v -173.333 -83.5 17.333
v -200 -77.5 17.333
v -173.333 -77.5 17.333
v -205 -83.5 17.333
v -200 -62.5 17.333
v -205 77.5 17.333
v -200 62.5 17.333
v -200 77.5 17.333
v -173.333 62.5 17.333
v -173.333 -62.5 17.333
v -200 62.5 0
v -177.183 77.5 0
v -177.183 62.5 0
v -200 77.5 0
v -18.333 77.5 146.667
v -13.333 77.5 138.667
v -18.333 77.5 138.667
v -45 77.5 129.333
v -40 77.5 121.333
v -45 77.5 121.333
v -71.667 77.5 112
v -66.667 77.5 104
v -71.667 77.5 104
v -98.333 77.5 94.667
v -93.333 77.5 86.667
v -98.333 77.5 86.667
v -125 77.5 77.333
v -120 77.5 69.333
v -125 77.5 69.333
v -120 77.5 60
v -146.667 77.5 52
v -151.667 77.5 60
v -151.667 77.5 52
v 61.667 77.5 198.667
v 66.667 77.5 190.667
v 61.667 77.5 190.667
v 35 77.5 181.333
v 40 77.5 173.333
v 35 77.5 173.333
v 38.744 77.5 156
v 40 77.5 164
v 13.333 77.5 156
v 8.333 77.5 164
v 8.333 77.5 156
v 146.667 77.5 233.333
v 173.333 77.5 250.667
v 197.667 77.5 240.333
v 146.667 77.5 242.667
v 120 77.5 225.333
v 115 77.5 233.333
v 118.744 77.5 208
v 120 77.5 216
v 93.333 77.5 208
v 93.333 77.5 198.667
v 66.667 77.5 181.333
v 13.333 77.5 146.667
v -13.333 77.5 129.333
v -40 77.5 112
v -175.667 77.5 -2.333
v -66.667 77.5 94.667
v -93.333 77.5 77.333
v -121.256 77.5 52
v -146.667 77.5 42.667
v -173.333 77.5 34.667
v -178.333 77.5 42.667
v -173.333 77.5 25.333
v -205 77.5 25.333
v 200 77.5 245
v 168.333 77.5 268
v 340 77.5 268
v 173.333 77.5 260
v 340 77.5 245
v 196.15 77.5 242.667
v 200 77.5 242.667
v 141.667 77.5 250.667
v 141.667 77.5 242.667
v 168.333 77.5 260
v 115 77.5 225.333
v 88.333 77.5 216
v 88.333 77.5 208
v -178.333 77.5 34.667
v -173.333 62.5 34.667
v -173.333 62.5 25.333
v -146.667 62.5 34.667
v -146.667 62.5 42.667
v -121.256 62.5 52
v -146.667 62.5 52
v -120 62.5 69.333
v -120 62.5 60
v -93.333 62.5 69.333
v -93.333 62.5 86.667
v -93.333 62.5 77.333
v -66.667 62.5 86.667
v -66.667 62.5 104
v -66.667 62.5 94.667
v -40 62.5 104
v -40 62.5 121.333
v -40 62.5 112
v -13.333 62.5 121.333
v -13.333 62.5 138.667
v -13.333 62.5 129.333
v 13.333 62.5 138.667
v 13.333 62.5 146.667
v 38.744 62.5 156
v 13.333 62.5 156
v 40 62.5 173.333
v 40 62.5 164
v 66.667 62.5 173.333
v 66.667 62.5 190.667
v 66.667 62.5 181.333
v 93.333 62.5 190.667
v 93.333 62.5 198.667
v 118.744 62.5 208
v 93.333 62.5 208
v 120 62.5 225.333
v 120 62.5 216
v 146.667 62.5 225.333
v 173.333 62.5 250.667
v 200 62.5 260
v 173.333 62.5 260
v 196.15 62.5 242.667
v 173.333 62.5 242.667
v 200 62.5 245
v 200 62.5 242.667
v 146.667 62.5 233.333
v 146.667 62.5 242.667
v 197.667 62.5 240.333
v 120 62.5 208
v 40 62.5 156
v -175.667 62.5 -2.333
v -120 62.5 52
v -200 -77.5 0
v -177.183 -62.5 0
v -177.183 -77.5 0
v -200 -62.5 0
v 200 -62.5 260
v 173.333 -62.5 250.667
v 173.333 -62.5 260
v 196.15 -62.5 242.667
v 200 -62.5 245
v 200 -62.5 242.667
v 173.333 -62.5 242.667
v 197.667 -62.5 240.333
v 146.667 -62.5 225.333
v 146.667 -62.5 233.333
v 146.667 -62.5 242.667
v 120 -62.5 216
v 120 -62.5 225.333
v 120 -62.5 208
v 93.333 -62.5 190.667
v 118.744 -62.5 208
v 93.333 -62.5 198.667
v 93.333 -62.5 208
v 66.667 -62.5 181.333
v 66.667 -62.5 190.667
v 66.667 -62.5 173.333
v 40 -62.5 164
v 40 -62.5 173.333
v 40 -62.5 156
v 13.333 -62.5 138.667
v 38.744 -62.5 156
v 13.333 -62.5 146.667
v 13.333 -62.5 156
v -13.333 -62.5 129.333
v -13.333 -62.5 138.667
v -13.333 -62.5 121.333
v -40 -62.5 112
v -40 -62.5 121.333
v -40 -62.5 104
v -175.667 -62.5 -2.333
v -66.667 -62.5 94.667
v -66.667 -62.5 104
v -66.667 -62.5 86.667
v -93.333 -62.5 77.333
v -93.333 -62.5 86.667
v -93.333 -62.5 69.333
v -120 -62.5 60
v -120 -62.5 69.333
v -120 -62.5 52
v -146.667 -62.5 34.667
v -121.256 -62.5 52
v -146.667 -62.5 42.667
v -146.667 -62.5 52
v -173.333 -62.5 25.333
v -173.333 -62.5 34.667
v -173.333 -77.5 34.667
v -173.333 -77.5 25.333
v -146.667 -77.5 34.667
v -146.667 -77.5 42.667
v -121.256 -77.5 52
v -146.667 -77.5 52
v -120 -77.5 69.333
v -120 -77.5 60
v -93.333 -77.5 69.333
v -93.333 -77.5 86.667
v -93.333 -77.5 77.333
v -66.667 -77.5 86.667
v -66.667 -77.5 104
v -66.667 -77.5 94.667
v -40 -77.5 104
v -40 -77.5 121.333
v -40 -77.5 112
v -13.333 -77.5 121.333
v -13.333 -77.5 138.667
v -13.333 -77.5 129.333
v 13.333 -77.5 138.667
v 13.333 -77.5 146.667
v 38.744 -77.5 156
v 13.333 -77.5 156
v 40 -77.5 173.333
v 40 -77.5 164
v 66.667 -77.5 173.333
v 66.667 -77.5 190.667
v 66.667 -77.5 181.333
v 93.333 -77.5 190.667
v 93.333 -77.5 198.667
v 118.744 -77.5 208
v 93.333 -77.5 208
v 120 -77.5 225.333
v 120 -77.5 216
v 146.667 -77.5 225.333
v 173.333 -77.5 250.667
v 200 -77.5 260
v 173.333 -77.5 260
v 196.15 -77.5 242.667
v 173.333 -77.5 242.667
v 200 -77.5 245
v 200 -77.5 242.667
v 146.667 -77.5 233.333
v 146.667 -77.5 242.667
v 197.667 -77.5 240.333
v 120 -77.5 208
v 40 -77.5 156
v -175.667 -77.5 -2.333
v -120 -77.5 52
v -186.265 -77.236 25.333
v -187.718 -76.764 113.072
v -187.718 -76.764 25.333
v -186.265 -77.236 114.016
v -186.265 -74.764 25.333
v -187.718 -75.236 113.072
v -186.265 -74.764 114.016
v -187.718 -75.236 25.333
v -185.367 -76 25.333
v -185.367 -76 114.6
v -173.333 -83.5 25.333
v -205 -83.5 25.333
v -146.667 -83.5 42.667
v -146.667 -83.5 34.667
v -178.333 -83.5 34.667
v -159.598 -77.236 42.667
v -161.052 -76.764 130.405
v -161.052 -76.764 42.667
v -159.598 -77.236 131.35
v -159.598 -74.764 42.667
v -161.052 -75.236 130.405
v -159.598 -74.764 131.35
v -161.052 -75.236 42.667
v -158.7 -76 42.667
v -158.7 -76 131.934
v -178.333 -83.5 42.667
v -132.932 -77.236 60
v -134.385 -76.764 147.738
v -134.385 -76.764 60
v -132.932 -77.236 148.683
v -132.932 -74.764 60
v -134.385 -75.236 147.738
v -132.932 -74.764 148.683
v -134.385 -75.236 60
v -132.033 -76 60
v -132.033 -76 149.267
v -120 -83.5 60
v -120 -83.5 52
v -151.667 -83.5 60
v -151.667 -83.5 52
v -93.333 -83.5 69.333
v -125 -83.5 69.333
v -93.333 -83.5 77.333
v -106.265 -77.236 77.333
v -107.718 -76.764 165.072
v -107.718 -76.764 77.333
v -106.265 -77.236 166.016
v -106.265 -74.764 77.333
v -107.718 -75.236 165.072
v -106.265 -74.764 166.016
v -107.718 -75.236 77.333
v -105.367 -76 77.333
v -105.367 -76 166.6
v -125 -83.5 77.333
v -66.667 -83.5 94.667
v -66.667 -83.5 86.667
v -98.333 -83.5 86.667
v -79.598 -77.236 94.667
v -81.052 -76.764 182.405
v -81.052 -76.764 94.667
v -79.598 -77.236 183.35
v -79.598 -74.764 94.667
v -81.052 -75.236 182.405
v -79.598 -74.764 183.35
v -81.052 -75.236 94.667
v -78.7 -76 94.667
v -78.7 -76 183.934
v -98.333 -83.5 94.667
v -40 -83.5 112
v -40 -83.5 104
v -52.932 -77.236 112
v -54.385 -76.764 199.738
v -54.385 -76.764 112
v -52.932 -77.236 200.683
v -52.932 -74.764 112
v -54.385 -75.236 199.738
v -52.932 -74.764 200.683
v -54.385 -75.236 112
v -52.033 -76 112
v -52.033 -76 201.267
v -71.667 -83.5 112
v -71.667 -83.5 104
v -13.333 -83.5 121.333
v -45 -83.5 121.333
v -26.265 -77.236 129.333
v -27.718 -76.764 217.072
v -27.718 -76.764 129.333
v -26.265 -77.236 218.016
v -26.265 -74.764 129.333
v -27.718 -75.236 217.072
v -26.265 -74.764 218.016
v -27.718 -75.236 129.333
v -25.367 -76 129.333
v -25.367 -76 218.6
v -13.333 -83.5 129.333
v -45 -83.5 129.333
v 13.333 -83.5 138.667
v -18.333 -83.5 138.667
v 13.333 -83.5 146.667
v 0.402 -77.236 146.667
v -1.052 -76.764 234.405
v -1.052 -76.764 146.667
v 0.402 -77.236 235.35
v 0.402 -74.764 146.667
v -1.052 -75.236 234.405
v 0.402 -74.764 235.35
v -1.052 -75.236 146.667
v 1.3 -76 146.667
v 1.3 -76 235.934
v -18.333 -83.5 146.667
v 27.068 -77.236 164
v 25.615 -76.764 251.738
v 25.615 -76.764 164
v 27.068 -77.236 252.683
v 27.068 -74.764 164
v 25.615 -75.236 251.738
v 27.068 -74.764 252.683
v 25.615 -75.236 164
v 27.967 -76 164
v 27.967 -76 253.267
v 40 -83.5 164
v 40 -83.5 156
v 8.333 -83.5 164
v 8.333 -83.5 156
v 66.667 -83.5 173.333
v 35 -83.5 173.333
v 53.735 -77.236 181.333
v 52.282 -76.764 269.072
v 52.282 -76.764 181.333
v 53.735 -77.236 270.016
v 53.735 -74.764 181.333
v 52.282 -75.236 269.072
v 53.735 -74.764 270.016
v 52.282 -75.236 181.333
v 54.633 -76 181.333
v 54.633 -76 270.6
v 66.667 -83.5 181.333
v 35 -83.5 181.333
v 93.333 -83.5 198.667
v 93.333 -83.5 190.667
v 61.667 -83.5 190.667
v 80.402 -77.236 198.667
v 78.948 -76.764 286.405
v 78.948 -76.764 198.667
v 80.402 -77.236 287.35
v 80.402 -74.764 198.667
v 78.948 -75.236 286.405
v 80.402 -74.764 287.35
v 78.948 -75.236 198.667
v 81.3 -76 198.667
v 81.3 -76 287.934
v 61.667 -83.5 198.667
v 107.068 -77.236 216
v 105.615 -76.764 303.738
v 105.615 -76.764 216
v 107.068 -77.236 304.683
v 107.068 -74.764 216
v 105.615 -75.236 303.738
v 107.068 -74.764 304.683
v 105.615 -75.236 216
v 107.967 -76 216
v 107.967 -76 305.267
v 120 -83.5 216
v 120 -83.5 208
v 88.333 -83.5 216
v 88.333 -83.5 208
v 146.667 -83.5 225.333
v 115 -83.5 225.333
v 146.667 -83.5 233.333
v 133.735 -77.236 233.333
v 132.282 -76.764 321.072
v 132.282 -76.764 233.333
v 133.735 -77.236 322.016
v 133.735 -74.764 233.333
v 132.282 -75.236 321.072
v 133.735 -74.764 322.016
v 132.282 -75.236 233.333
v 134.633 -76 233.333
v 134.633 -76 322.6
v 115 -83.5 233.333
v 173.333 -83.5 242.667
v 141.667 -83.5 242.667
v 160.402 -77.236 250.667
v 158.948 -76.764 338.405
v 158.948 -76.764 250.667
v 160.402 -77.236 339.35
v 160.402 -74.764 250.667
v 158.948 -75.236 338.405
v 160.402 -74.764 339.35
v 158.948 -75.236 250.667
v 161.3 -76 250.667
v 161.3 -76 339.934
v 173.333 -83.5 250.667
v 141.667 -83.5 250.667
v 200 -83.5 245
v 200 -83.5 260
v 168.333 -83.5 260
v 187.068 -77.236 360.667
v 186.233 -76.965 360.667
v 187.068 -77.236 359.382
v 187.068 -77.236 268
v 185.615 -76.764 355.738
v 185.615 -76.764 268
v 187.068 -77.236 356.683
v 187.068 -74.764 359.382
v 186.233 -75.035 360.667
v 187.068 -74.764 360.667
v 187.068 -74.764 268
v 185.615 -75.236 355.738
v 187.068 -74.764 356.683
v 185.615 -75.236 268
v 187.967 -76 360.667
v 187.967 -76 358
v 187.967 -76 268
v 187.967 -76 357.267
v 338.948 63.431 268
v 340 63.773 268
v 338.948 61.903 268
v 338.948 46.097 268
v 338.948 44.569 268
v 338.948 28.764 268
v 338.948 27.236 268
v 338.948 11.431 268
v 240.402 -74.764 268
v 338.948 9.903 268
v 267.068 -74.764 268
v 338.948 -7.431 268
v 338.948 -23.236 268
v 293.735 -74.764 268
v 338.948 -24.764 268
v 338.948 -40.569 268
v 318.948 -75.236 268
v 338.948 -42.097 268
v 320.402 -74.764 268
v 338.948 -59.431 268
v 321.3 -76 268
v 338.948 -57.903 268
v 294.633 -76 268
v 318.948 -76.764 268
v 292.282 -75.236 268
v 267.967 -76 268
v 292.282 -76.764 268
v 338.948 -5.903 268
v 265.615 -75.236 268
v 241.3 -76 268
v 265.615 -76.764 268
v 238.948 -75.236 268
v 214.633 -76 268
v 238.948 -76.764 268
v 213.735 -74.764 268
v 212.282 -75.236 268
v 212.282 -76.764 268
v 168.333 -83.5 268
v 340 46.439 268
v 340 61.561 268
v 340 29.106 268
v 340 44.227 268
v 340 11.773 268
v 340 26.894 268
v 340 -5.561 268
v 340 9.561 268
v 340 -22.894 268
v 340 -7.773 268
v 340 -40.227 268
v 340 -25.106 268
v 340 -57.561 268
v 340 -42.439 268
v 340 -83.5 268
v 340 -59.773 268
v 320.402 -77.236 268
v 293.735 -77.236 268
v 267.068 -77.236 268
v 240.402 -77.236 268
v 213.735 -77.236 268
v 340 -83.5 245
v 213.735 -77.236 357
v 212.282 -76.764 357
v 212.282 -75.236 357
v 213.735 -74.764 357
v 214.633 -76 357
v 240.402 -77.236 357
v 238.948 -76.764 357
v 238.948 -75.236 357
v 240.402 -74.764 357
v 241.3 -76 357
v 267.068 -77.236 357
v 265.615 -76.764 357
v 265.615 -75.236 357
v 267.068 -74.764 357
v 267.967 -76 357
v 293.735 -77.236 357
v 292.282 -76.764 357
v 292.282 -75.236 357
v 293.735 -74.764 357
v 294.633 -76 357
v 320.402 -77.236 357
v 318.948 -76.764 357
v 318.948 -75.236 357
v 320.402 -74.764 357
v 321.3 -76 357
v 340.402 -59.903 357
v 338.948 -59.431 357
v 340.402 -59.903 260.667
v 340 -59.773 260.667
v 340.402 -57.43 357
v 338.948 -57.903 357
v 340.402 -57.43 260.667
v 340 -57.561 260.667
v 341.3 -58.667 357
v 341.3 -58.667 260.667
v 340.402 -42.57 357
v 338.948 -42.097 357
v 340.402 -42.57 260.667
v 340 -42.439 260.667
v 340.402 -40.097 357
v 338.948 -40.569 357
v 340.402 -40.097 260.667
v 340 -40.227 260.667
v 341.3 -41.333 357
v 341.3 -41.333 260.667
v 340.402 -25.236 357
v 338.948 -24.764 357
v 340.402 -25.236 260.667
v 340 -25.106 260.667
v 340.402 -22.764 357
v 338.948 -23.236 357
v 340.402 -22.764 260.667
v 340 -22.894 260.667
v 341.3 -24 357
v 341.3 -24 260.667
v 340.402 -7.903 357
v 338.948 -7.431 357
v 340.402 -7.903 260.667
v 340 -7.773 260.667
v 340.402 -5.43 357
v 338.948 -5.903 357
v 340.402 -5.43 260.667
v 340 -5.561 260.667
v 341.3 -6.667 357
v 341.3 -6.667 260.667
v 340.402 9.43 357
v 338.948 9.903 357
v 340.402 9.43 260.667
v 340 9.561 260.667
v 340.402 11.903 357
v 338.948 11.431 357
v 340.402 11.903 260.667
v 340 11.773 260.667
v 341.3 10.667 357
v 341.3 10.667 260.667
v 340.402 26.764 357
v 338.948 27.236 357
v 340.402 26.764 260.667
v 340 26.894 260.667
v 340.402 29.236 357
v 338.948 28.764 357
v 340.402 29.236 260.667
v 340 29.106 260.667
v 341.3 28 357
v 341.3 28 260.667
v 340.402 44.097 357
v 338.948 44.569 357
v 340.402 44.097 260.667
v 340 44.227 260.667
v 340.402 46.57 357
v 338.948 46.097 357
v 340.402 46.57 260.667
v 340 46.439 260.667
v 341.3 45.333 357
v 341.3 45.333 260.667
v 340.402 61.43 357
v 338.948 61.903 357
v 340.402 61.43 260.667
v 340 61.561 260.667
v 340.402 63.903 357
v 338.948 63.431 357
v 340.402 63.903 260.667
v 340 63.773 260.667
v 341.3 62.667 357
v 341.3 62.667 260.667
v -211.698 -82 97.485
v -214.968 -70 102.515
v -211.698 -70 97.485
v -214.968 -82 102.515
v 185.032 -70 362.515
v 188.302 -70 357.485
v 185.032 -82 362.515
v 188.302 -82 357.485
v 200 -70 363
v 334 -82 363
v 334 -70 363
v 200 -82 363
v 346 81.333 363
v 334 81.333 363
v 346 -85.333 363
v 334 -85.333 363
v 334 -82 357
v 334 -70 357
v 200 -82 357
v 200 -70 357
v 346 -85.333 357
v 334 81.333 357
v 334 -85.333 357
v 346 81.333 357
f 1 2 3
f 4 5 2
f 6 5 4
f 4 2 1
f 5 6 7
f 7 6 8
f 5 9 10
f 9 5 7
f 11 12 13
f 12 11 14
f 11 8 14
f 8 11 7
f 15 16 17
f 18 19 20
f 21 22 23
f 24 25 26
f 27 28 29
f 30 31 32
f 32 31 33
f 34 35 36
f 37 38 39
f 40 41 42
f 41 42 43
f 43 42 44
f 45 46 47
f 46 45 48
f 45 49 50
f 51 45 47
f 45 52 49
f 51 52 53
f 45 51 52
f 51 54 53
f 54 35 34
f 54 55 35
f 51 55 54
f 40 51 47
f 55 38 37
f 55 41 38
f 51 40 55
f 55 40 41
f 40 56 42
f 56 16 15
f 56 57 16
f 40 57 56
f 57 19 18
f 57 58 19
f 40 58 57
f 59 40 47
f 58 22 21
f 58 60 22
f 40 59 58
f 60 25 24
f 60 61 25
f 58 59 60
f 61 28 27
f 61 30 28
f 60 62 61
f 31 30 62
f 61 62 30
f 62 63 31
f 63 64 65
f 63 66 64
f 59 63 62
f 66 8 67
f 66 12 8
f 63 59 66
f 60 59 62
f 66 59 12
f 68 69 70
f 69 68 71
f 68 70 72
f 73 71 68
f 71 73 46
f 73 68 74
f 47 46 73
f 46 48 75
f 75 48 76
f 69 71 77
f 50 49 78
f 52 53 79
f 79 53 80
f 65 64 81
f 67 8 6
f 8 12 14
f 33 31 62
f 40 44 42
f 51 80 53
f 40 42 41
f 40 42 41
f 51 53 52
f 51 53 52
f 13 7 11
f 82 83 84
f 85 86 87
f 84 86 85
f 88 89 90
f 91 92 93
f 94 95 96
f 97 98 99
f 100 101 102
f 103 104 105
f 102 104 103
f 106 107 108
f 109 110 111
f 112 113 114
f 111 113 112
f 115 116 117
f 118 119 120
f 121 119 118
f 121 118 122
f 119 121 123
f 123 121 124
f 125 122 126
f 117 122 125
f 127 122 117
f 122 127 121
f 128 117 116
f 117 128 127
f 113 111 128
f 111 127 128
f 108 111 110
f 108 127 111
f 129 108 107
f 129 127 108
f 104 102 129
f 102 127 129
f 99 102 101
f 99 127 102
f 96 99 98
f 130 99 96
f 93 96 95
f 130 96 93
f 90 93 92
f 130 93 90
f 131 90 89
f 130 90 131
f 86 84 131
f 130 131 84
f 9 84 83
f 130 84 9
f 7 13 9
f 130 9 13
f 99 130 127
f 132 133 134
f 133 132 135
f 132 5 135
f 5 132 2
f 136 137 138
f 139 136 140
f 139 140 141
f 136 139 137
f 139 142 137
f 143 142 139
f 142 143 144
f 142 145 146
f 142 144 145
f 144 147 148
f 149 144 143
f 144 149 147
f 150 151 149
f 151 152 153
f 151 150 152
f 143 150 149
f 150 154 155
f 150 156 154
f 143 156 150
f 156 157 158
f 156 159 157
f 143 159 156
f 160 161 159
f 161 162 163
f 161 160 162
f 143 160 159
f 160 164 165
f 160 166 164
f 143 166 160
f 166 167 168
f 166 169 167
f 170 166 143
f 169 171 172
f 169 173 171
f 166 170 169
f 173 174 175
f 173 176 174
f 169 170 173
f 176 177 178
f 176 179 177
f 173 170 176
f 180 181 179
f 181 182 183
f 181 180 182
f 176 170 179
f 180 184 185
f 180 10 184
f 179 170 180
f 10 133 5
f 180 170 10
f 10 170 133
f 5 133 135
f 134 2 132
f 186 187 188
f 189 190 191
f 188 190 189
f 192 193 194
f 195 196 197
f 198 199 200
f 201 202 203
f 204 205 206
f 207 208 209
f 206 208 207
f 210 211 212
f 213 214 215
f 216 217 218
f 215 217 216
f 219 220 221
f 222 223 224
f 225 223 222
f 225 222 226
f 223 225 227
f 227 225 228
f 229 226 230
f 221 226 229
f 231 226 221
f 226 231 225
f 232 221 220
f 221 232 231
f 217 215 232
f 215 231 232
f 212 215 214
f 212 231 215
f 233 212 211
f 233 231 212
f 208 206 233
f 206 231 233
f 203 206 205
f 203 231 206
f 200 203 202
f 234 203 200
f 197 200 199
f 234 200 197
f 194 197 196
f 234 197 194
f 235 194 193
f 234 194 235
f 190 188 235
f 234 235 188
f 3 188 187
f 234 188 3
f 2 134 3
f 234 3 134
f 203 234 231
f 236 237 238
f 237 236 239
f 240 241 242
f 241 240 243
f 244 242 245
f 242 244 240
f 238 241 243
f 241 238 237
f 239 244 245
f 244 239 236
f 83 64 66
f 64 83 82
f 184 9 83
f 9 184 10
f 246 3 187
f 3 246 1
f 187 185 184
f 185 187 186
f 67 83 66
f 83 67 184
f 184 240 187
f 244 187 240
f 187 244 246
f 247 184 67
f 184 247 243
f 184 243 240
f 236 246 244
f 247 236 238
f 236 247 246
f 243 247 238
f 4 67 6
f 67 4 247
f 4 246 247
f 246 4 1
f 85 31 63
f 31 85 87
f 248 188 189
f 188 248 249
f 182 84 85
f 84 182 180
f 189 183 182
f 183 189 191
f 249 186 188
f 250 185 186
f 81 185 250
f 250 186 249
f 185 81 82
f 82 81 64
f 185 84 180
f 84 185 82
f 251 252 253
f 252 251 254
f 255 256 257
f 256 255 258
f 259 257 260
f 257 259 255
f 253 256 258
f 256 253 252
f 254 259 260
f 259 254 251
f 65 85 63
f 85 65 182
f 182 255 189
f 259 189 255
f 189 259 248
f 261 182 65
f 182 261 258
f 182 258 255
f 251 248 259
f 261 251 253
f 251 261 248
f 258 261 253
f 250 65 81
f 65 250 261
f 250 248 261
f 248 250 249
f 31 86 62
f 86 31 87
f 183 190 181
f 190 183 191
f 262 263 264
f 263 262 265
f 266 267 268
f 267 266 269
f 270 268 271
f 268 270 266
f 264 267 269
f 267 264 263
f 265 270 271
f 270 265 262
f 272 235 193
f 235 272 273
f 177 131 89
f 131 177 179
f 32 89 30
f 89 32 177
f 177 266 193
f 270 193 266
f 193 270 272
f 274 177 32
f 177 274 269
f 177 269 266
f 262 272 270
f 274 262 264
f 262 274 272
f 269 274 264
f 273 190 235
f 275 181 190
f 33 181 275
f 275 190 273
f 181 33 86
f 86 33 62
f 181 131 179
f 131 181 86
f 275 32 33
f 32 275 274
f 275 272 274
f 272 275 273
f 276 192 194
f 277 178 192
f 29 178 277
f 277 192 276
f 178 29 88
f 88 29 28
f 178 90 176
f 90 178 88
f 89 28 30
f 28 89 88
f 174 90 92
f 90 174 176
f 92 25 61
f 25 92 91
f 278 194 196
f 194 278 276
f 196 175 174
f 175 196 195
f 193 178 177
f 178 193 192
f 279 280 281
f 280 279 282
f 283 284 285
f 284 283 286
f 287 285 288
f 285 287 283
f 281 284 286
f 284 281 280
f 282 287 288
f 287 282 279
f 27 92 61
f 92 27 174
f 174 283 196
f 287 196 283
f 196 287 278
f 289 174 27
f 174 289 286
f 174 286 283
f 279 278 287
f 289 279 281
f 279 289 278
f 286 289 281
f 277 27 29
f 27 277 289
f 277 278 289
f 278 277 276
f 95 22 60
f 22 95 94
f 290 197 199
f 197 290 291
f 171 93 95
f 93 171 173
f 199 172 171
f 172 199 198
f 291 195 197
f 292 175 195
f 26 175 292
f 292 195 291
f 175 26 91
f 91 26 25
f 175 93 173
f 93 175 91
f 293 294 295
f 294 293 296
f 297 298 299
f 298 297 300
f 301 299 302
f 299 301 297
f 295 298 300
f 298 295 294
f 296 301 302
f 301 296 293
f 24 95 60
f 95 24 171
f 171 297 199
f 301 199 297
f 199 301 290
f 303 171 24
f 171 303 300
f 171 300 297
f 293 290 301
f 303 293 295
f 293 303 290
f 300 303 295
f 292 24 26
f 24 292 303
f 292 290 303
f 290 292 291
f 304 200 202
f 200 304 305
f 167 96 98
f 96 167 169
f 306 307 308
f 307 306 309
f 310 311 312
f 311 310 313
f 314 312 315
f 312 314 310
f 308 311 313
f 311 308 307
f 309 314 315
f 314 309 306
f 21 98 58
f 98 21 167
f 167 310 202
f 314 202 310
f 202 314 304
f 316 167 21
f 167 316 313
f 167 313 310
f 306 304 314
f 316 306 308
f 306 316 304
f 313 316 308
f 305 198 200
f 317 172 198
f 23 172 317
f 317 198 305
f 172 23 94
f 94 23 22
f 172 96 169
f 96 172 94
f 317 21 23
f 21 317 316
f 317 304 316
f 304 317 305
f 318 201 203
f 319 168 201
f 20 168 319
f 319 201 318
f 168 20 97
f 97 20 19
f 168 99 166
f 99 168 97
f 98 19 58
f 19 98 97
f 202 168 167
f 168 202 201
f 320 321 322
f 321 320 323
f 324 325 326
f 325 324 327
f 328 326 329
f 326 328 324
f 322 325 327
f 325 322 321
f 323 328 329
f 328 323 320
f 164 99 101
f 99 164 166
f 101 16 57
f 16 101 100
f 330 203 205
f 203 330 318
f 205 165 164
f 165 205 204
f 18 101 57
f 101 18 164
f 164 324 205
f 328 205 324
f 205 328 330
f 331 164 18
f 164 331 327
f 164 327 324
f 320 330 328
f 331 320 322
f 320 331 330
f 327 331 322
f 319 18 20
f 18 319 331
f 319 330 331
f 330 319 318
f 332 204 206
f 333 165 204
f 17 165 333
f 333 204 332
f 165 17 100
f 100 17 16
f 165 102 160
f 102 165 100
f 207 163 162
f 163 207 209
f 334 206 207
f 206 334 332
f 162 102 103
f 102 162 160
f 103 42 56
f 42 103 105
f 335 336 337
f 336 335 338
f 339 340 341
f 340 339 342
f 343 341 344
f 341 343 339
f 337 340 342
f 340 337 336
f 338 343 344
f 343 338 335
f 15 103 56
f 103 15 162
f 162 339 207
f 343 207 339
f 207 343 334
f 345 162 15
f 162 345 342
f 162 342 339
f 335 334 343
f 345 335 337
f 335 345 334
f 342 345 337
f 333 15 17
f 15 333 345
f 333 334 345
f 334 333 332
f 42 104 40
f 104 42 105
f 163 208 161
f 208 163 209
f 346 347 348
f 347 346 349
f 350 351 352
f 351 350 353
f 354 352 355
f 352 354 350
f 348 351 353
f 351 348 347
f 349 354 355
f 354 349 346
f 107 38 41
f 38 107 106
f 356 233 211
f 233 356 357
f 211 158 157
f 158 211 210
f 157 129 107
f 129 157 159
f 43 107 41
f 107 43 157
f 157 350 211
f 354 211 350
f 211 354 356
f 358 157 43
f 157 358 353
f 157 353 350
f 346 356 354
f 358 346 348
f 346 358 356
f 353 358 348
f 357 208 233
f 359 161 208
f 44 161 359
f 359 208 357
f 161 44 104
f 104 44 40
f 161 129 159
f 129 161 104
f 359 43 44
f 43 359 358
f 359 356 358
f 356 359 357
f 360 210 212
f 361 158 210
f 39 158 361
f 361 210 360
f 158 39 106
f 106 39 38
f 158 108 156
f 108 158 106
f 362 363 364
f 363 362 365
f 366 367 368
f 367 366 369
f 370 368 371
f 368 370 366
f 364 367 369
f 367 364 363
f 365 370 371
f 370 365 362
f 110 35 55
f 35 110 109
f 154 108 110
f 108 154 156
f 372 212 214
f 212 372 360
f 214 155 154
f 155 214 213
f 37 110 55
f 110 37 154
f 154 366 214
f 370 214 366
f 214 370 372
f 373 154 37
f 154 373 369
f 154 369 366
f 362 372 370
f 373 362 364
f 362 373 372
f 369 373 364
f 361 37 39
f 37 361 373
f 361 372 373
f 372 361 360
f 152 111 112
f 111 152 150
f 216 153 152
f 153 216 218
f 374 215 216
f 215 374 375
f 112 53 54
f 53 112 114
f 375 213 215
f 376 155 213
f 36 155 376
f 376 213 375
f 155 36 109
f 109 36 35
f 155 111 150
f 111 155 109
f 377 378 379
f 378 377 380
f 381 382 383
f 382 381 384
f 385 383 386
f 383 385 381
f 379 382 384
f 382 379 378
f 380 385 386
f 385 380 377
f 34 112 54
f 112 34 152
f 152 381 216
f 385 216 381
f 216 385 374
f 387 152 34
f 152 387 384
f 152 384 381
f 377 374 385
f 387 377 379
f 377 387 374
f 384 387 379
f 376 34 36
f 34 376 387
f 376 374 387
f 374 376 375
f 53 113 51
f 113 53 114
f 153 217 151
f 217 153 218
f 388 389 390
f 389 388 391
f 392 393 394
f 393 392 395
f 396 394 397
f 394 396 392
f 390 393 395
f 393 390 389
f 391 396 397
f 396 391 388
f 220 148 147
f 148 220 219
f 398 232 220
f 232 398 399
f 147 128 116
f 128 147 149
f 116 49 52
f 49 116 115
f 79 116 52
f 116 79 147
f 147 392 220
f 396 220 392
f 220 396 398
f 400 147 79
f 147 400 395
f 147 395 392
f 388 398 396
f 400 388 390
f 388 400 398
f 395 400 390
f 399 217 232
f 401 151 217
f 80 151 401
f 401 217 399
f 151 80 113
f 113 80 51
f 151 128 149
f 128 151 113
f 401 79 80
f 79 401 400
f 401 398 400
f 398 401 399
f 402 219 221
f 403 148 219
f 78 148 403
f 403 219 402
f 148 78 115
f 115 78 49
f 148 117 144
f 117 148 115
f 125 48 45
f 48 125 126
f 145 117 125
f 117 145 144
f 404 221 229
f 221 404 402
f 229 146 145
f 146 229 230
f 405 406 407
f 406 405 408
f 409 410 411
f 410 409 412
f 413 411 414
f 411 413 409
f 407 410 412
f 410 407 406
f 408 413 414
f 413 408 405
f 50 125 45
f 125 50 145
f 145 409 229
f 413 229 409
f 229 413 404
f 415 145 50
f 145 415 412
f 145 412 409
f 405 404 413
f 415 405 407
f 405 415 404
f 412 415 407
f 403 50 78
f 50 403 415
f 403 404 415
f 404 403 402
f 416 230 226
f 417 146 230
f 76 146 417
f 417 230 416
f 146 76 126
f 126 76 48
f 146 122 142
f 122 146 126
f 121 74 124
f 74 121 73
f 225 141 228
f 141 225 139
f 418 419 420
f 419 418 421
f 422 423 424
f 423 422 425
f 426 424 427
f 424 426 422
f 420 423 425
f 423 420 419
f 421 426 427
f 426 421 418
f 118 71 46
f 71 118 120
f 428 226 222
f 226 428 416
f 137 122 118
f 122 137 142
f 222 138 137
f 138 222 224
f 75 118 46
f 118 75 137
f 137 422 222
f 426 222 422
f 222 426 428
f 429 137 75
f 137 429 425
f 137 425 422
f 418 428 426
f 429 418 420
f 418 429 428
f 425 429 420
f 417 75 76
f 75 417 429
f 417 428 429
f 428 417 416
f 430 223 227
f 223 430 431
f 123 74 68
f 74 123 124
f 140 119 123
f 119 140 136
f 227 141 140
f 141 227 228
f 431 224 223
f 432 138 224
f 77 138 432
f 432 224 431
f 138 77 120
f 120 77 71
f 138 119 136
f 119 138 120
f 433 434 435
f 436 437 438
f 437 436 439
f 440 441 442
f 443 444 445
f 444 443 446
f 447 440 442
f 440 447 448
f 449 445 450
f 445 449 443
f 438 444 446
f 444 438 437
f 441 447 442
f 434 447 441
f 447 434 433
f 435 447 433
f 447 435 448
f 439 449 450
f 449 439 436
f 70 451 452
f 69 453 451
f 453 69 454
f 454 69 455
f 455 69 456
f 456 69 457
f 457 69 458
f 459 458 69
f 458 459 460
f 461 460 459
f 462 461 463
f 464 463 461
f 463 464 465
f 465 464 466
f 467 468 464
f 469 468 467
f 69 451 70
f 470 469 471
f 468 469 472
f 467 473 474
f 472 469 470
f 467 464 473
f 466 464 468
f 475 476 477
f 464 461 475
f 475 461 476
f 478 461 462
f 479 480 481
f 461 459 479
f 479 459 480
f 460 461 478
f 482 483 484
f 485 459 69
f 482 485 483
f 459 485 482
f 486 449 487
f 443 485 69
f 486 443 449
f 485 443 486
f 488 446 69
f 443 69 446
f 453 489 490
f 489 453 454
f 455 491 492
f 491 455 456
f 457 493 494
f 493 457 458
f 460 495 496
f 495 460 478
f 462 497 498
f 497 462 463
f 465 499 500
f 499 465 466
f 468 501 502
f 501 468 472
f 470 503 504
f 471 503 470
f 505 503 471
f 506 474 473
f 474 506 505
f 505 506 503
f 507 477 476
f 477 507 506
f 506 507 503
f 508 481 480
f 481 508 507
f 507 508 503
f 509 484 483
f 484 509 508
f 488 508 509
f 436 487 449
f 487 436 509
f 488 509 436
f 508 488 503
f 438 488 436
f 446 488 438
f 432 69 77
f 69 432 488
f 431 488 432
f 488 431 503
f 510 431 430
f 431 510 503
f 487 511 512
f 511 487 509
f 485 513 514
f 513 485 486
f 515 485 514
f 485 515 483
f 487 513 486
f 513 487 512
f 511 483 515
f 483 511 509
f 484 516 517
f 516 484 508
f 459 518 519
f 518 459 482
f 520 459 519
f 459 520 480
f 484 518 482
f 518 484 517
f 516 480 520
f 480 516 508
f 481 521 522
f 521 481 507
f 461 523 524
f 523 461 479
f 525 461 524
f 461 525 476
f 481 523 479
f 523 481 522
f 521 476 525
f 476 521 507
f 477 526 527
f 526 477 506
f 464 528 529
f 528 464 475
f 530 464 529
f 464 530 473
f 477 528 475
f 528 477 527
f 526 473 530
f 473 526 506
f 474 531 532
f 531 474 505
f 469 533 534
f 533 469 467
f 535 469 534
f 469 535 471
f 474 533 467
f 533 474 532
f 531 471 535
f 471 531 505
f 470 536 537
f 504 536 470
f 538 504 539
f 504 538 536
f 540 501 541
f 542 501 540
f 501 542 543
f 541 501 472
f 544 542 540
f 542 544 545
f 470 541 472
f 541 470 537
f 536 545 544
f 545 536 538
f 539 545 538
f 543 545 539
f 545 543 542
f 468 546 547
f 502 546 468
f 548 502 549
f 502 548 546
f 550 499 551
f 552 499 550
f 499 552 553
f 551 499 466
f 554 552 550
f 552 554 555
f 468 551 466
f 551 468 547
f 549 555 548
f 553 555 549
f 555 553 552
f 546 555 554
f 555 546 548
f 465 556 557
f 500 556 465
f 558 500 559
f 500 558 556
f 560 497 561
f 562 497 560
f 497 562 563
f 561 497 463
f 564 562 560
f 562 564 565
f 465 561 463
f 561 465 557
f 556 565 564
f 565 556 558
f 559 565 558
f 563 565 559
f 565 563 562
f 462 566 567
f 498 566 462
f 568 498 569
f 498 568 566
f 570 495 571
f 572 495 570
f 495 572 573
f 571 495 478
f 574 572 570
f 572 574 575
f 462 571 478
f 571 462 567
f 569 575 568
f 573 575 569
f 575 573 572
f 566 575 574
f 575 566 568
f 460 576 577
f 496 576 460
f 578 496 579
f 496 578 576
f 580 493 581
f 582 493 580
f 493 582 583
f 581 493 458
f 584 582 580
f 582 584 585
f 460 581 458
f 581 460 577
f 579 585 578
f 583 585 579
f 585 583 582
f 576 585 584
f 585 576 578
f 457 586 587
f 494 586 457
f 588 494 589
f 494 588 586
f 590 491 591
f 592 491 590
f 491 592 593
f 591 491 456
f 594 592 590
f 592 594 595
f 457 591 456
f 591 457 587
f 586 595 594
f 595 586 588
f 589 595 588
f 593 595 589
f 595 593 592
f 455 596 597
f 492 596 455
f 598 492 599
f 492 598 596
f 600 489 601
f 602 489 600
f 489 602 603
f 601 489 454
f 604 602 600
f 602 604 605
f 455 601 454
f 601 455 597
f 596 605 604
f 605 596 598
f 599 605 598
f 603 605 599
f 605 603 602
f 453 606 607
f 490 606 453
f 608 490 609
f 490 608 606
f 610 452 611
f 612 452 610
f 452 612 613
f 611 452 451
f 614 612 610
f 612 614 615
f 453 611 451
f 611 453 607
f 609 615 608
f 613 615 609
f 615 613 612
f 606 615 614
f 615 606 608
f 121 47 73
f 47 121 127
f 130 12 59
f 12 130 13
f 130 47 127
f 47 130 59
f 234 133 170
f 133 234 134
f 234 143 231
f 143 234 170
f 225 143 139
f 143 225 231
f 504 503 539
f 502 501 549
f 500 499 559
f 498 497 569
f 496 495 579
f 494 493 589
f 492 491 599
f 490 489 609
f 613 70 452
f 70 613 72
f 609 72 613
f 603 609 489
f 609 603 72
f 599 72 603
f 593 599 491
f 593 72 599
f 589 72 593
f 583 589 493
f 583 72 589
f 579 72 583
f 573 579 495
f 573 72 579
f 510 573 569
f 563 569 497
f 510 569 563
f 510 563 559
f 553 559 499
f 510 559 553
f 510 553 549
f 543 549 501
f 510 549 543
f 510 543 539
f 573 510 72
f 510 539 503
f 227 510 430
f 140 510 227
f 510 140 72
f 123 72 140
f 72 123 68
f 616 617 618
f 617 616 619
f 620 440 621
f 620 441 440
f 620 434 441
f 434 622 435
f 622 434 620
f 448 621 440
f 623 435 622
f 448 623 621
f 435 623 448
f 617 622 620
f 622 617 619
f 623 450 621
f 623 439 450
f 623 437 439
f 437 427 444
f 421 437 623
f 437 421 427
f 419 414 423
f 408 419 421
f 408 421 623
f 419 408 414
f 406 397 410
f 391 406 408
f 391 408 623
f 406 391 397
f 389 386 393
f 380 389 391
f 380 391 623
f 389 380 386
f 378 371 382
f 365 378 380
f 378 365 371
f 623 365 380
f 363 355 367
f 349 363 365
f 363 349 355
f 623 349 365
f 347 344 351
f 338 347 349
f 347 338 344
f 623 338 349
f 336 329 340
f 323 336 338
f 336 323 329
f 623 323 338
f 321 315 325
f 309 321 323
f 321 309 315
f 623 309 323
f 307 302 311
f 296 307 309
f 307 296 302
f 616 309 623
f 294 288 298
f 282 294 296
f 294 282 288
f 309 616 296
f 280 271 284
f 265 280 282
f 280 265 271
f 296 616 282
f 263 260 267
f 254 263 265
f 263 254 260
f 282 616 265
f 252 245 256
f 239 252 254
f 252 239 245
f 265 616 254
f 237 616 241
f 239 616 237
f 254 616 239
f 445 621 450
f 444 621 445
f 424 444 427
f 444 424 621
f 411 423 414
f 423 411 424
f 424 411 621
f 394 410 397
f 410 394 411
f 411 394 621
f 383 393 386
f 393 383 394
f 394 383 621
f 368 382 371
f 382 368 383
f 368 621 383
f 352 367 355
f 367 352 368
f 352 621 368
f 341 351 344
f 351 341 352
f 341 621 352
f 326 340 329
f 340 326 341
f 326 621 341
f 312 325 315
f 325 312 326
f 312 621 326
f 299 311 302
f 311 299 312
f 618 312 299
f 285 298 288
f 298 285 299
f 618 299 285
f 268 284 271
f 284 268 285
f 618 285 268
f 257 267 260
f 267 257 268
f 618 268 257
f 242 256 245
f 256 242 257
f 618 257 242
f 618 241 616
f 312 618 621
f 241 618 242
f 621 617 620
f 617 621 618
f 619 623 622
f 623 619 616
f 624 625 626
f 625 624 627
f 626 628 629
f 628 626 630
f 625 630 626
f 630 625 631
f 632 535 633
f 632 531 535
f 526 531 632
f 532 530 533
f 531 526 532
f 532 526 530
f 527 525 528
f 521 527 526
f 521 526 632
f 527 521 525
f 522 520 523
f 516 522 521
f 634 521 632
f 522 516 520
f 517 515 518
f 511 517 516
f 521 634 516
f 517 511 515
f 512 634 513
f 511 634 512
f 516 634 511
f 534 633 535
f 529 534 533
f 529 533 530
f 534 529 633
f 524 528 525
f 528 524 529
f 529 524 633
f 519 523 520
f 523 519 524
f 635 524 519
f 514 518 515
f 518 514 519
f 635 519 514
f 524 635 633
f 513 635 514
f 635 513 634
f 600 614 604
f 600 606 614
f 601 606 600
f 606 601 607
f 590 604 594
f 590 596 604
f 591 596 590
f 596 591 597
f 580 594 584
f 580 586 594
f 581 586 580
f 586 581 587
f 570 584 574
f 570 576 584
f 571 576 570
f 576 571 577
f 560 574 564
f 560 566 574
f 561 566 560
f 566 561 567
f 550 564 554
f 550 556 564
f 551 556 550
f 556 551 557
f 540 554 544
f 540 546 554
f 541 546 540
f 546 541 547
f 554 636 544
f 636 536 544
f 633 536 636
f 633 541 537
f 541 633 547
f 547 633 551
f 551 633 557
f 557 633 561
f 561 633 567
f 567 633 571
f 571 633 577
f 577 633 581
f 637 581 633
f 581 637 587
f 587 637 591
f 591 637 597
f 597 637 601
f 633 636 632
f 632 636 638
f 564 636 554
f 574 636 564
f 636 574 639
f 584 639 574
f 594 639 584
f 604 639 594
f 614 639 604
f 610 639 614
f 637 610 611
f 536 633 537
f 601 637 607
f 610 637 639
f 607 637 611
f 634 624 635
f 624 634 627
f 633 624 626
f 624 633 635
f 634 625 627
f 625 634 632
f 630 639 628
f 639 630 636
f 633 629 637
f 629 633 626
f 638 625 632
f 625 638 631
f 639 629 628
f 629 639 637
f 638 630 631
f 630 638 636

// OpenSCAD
module longstairs(length = 400, height = 260, width = 140, n_steps=15)
{
    beam_width = 15;
    stair_thickness = 8;
    
    x_step = length / n_steps;
    z_step = height / n_steps;
    extend_w = 6;
    extend_step = 5;
    balcony_size = 140;
    balcony_thickness = beam_width + stair_thickness;
    railing_height = 100;
    railing_bar_radius = 1.3;
    railing_pos = -width/2 - 6;
    railing_w = 12;
    railing_thickness = 6;
    
    union() {
            
        for (i = [0:n_steps-1])
        {
            x = x_step * i - length/2; 
            z = z_step * i;
            
            translate([x+0.5*x_step, width/2, z+0.5*z_step])
            cube ([x_step, beam_width, z_step], center=true);
            
            translate([x+0.5*x_step, -width/2, z+0.5*z_step])
            cube ([x_step, beam_width, z_step], center=true);
            
            translate([x+0.5*x_step, railing_pos, z+1.5*z_step-stair_thickness])
            cylinder(h =railing_height, r = railing_bar_radius);
            
            translate([x+0.5*x_step-extend_step/2, 
                -extend_w/2, 
                z+1.0*z_step + stair_thickness/2])
            cube ([x_step+extend_step, 
                width+beam_width+extend_w, 
                stair_thickness], center=true);
        }
        
        dx = x_step * (n_steps-1);
        dz = z_step * (n_steps-1);
        l = sqrt(dx*dx + dz*dz);
        w = sqrt(x_step*x_step + z_step*z_step);
        
        translate([x_step/4, width/2, height/2 - z_step/4])
        rotate([0, -atan2(z_step, x_step), 0])
        cube ([l, beam_width, w*0.5], center=true);
        
        translate([x_step/4, -width/2, height/2 - z_step/4])
        rotate([0, -atan2(z_step, x_step), 0])
        cube ([l, beam_width, w*0.5], center=true);
        
        translate([(n_steps-1)*x_step/2+0.5*x_step + balcony_size/2, -extend_w/2, (n_steps-1)*z_step+1.0*z_step - balcony_thickness/2 + stair_thickness])
            cube ([balcony_size, width+beam_width+extend_w, balcony_thickness], center=true);
        
        for (x = [length/2  /*+ 0.5*x_step-extend_step/2 */:
             x_step:
             length/2 + balcony_size - x_step])
        {
            last_x = x+0.5*x_step;
            translate([last_x, railing_pos, height+0.5*z_step-stair_thickness])
            cylinder(h = railing_height, r = railing_bar_radius); 
        }
        
        for (z = [railing_pos + z_step: z_step: width/2])
        {
            translate([length/2+balcony_size, z, height+0.5*z_step-stair_thickness])
            cylinder(h = railing_height, r = railing_bar_radius);
        }
        
        dx2 = (x_step) * n_steps;
        dz2 = (z_step) * n_steps;
        l2 = sqrt(dx2*dx2 + dz2*dz2);
        //w = sqrt(x_step*x_step + z_step*z_step);
        
        translate([-x_step/2, railing_pos, railing_height + height/2])
        rotate([0, -atan2(z_step, x_step), 0])
        cube ([l2, railing_w, railing_thickness], center=true);
        
        translate([length/2+balcony_size/2, railing_pos, railing_height + height])
        cube ([balcony_size, railing_w, railing_thickness], center=true);
        
        translate([length/2+balcony_size, width/2+railing_pos+railing_w/3, railing_height + height])
    cube ([railing_w, width+x_step, railing_thickness], center=true);
    }
}

// For testing
longstairs();
